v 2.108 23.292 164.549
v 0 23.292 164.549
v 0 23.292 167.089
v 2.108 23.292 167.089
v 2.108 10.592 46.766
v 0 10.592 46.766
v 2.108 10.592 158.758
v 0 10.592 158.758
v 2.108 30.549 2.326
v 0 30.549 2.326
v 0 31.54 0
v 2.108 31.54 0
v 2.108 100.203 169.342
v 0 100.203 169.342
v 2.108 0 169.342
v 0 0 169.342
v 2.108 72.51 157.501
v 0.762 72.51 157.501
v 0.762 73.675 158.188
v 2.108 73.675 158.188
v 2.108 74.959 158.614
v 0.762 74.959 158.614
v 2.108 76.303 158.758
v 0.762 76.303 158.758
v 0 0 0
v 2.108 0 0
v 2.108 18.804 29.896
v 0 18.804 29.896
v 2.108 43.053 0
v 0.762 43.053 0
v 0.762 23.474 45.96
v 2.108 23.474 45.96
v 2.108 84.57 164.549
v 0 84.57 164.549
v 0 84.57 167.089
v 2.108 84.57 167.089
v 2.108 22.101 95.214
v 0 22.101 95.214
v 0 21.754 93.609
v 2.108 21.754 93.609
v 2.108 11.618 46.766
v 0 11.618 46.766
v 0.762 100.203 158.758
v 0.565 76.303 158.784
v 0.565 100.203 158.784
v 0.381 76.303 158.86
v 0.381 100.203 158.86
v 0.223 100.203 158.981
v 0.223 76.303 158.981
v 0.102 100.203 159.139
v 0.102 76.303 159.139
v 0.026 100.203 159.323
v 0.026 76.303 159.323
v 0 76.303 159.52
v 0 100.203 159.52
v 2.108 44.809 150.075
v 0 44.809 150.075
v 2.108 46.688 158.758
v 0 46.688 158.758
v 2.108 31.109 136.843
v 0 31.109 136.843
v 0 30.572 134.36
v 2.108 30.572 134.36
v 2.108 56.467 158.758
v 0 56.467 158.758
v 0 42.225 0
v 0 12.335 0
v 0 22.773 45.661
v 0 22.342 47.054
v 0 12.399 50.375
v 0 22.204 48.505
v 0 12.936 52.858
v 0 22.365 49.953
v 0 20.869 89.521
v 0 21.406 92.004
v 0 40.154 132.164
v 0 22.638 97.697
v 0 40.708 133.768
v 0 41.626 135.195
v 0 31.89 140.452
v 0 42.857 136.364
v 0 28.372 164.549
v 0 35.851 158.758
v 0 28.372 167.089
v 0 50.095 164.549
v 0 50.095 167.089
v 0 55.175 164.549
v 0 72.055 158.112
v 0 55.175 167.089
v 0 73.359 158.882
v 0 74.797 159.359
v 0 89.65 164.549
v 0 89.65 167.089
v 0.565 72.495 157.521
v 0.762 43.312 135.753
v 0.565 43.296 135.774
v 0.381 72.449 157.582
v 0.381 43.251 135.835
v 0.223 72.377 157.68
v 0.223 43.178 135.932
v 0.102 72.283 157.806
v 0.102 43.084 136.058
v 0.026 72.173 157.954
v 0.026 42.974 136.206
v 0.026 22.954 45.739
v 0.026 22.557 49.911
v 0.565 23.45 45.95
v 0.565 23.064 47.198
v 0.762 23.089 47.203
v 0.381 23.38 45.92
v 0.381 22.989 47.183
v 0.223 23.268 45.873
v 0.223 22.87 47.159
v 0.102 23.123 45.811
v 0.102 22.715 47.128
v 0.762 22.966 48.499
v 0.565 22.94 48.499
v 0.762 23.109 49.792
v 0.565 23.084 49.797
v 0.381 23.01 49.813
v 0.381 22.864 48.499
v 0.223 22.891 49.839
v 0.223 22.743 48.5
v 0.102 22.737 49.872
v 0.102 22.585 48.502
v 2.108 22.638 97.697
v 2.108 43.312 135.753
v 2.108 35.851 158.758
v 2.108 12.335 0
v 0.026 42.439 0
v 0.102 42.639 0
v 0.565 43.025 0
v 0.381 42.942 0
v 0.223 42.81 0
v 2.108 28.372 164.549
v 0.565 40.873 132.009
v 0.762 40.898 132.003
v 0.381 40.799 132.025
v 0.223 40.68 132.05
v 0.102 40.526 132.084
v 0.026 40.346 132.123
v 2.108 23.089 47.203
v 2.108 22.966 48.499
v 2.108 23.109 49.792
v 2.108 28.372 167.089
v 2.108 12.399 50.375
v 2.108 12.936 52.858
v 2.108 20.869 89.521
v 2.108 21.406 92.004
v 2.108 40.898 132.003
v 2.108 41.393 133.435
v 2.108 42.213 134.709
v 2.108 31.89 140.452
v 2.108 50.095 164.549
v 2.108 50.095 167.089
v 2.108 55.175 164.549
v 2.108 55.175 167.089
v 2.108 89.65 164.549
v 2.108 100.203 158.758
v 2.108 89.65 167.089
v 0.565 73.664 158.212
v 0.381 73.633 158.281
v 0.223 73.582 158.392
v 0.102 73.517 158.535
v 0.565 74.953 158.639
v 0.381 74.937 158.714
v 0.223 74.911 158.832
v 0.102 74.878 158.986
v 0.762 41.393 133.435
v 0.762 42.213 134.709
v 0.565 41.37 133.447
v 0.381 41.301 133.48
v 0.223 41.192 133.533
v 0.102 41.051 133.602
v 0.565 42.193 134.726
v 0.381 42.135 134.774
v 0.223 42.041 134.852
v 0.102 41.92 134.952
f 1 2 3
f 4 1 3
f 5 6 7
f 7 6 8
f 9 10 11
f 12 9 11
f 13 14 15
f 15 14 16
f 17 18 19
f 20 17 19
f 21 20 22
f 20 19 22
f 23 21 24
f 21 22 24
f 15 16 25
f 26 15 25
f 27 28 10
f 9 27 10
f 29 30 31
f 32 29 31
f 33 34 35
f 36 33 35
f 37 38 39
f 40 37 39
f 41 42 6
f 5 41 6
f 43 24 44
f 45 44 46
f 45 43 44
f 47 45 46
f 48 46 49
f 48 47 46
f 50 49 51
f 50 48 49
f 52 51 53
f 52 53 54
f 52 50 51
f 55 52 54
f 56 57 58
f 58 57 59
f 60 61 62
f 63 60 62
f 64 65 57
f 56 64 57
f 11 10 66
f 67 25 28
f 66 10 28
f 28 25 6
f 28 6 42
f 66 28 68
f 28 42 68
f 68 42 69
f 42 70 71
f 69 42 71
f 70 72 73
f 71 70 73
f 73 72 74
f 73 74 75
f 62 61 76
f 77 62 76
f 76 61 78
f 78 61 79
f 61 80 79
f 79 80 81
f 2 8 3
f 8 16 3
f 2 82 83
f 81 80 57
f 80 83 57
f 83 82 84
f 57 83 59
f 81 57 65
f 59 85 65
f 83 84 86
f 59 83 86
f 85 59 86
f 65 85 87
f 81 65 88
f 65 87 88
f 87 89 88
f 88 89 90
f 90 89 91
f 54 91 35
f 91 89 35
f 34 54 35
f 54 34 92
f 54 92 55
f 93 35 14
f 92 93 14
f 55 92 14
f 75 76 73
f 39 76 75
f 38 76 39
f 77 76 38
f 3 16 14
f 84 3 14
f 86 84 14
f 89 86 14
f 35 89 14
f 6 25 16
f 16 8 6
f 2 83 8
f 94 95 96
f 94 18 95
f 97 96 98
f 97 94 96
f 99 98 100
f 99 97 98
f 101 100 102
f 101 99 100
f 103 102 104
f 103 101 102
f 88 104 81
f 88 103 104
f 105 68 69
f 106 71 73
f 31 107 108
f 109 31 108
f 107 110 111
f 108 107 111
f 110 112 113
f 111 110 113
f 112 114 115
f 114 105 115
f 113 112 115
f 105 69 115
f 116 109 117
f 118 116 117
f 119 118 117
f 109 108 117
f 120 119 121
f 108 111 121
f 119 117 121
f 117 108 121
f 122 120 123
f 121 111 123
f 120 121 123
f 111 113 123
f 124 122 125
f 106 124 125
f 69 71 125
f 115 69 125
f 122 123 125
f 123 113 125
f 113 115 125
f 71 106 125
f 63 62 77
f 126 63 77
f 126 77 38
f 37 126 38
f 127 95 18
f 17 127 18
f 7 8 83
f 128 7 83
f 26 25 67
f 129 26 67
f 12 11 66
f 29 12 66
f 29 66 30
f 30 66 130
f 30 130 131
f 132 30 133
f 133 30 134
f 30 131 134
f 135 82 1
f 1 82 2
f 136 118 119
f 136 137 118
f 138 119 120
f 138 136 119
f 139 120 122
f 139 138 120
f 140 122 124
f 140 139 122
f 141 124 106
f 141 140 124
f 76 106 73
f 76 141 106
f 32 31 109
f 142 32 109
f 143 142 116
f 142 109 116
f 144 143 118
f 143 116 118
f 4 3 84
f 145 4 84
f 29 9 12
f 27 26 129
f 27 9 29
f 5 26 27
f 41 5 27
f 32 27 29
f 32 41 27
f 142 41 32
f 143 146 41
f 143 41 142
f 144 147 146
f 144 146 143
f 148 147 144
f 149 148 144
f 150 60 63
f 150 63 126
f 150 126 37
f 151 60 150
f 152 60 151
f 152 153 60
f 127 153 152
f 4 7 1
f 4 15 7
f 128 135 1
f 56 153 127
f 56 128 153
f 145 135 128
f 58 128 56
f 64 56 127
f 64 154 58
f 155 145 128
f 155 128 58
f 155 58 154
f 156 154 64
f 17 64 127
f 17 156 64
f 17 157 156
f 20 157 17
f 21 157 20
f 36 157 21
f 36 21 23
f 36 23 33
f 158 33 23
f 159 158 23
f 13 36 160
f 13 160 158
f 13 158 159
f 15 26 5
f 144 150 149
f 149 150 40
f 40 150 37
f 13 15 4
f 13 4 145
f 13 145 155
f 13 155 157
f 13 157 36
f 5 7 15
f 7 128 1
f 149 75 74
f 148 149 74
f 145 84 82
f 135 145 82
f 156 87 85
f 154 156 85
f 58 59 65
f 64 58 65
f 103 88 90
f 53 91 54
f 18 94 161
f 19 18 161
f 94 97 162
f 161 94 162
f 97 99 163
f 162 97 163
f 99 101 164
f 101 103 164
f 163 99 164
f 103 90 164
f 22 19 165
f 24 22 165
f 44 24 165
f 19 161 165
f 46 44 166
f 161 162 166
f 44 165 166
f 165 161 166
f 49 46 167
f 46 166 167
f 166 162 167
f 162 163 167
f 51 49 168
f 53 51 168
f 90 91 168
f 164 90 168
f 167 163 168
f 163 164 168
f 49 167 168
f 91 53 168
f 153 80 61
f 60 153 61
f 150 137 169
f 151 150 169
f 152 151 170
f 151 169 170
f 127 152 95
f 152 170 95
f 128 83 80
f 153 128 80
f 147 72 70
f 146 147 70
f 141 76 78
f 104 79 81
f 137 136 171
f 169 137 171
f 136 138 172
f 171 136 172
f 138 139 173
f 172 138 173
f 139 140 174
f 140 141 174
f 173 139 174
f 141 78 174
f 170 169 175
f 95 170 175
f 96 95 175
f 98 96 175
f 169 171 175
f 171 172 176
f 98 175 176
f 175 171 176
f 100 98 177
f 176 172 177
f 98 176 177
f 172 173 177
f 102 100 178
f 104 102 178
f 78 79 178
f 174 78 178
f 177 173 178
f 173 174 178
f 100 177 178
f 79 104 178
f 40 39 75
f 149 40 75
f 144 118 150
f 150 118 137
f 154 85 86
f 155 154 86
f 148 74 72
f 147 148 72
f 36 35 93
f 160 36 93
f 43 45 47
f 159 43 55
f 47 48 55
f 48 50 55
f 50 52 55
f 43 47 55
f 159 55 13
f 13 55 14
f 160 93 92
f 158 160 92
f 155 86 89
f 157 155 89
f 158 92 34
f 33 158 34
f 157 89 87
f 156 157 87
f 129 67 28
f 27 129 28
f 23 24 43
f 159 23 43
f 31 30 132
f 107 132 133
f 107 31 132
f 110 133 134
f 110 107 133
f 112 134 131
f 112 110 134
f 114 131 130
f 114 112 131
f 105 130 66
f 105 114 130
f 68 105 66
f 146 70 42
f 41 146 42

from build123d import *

# Parameters (mm, degrees)
F1_DEPTH = 2.1082
F2_R     = 0.762


# Not quite as in the source:
# - a feature names something its author has since deleted; it is built from what else it names


with BuildPart() as f1:
    # F0 (on Right) → F1 (new body)
    with BuildSketch(Plane.YZ):
        with BuildLine():
            Line((0, 169.3418), (0, 0))
            Line((0, 0), (12.335197777, 0))
            Line((12.335197777, 0), (18.8042013144, 29.896105485))
            Line((18.8042013144, 29.896105485), (30.5493542935, 2.3257501254))
            Line((30.5493542935, 2.3257501254), (31.5401391658, 0))
            Line((31.5401391658, 0), (31.5707651968, 0))
            Line((31.5707651968, 0), (40.8442968098, 0))
            Line((40.8442968098, 0), (20.5594925834, 47.616175108))
            Line((20.5594925834, 47.616175108), (39.5771112022, 135.5049402038))
            Line((39.5771112022, 135.5049402038), (73.5248959406, 160.7899383022))
            Line((73.5248959406, 160.7899383022), (100.203, 160.7899383022))
            Line((100.203, 160.7899383022), (100.203, 162.0091375))
            Line((100.203, 162.0091375), (82.1398573303, 162.0091375))
            ThreePointArc((82.1398573303, 162.0091375), (80.3438061061, 162.7530862758), (79.5998573303, 164.5491375))
            Line((79.5998573303, 164.5491375), (79.5998573303, 169.3418))
            Line((79.5998573303, 169.3418), (70.6874244764, 169.3418))
            Line((70.6874244764, 169.3418), (70.6874244764, 165.8480664454))
            Line((70.6874244764, 165.8480664454), (70.6874244764, 164.5491375))
            ThreePointArc((70.6874244764, 164.5491375), (70.0510915867, 162.8675752701), (68.4609272063, 162.0285589874))
            ThreePointArc((68.4609272063, 162.0285589874), (68.3044763435, 162.0139975214), (68.1474244764, 162.0091375))
            Line((68.1474244764, 162.0091375), (18.2118, 162.0091375))
            ThreePointArc((18.2118, 162.0091375), (16.4157487758, 162.7530862758), (15.6718, 164.5491375))
            Line((15.6718, 164.5491375), (15.6718, 169.3418))
            Line((15.6718, 169.3418), (0, 169.3418))
        make_face()
        Polygon((21.4843682503, 35.8535070154), (23.4753466245, 31.1799211209), (21.1385536773, 30.1844319338), (19.147575303, 34.8580178283), align=None, mode=Mode.SUBTRACT)
        Polygon((25.8665425285, 25.5668719827), (27.8575209028, 20.8932860882), (25.5207279555, 19.8977969011), (23.5297495813, 24.5713827956), align=None, mode=Mode.SUBTRACT)
        with BuildLine():
            Line((12.3986134924, 50.3752630702), (11.6175919588, 46.7658196656))
            Line((11.6175919588, 46.7658196656), (10.5918, 46.7658196656))
            Line((10.5918, 46.7658196656), (10.5918, 158.7579375))
            Line((10.5918, 158.7579375), (35.8507619547, 158.7579375))
            Line((35.8507619547, 158.7579375), (31.8897708968, 140.4524587956))
            Line((31.8897708968, 140.4524587956), (31.1087493632, 136.8430153909))
            Line((31.1087493632, 136.8430153909), (35.5475592049, 135.882533211))
            ThreePointArc((35.5475592049, 135.882533211), (37.1456481821, 134.7755682604), (37.4929253116, 132.8628062845))
            Line((37.4929253116, 132.8628062845), (29.5595533377, 96.1992113407))
            ThreePointArc((29.5595533377, 96.1992113407), (28.452588387, 94.6011223635), (26.5398264112, 94.2538452339))
            Line((26.5398264112, 94.2538452339), (22.1010165695, 95.2143274138))
            Line((22.1010165695, 95.2143274138), (21.7536814278, 93.6091392306))
            Line((21.7536814278, 93.6091392306), (21.4063462861, 92.0039510473))
            Line((21.4063462861, 92.0039510473), (25.8451561277, 91.0434688674))
            ThreePointArc((25.8451561277, 91.0434688674), (27.4432451049, 89.9365039168), (27.7905222345, 88.0237419409))
            Line((27.7905222345, 88.0237419409), (19.8571502605, 51.3601469971))
            ThreePointArc((19.8571502605, 51.3601469971), (18.7501853099, 49.7620580199), (16.837423334, 49.4147808903))
            Line((16.837423334, 49.4147808903), (12.3986134924, 50.3752630702))
        make_face(mode=Mode.SUBTRACT)
        Polygon((47.0613097153, 149.2568137468), (48.5785484084, 147.2197602993), (44.5044415132, 144.1852829132), (42.9872028202, 146.2223363607), align=None, mode=Mode.SUBTRACT)
        Polygon((44.8088104432, 150.074821282), (46.6876875952, 158.7579375), (56.4668125154, 158.7579375), align=None, mode=Mode.SUBTRACT)
        Polygon((63.2751536106, 161.3332132886), (64.7923923036, 159.296159841), (60.7182854085, 156.2616824549), (59.2010467154, 158.2987359025), align=None, mode=Mode.SUBTRACT)
        with BuildLine():
            Line((20.5594925834, 47.616175108), (40.8442968098, 0))
            Line((40.8442968098, 0), (43.053, 0))
            Line((43.053, 0), (23.4736756901, 45.9601445708))
            ThreePointArc((23.4736756901, 45.9601445708), (22.9941781878, 47.847708452), (23.1092917667, 49.7918185633))
            Line((23.1092917667, 49.7918185633), (40.8984089502, 132.0031391675))
            ThreePointArc((40.8984089502, 132.0031391675), (41.765080018, 134.0967787378), (43.3116785091, 135.7528217618))
            Line((43.3116785091, 135.7528217618), (72.5103326221, 157.500571119))
            ThreePointArc((72.5103326221, 157.500571119), (74.3053957564, 158.4354047741), (76.3034293547, 158.7579375))
            Line((76.3034293547, 158.7579375), (100.203, 158.7579375))
            Line((100.203, 158.7579375), (100.203, 160.7899383022))
            Line((100.203, 160.7899383022), (73.5248959406, 160.7899383022))
            Line((73.5248959406, 160.7899383022), (39.5771112022, 135.5049402038))
            Line((39.5771112022, 135.5049402038), (20.5594925834, 47.616175108))
        make_face()
        Polygon((68.1474244764, 169.3418), (18.2118, 169.3418), (18.2118, 164.5491375), (23.2918, 164.5491375), (23.2918, 167.0891375), (28.3718, 167.0891375), (28.3718, 164.5491375), (50.0948093832, 164.5491375), (50.0948093832, 167.0891375), (55.1748093832, 167.0891375), (55.1748093832, 164.5491375), (68.1474244764, 164.5491375), (68.1474244764, 165.0060867035), align=None)
        with BuildLine():
            Line((18.2118, 169.3418), (15.6718, 169.3418))
            Line((15.6718, 169.3418), (15.6718, 164.5491375))
            ThreePointArc((15.6718, 164.5491375), (16.4157487758, 162.7530862758), (18.2118, 162.0091375))
            Line((18.2118, 162.0091375), (68.1474244764, 162.0091375))
            ThreePointArc((68.1474244764, 162.0091375), (68.3044763435, 162.0139975214), (68.4609272063, 162.0285589874))
            Line((68.4609272063, 162.0285589874), (69.6856973646, 162.9407926238))
            Line((69.6856973646, 162.9407926238), (68.1474244764, 165.0060867035))
            Line((68.1474244764, 165.0060867035), (68.1474244764, 164.5491375))
            Line((68.1474244764, 164.5491375), (55.1748093832, 164.5491375))
            Line((55.1748093832, 164.5491375), (50.0948093832, 164.5491375))
            Line((50.0948093832, 164.5491375), (28.3718, 164.5491375))
            Line((28.3718, 164.5491375), (23.2918, 164.5491375))
            Line((23.2918, 164.5491375), (18.2118, 164.5491375))
            Line((18.2118, 164.5491375), (18.2118, 169.3418))
        make_face()
        Polygon((20.8691658762, 89.5214045307), (12.9357939022, 52.8578095868), (17.3746037439, 51.8973274069), (18.6675621562, 57.872655888), (16.1850156395, 58.4098362979), (17.2593764593, 63.3749293312), (19.7419229759, 62.8377489213), (22.9432277355, 77.6323837102), (20.4606812189, 78.16956412), (21.5350420386, 83.1346571533), (24.0175885553, 82.5974767434), (25.3079757178, 88.5609223508), align=None)
        Polygon((35.010378795, 133.3999866944), (30.5715689534, 134.3604688743), (22.6381969794, 97.6968739305), (27.077006821, 96.7363917505), (28.3673939836, 102.6998373579), (25.884847467, 103.2370177677), (26.9592082867, 108.202110801), (29.4417548033, 107.6649303911), (32.643059563, 122.45956518), (30.1605130463, 122.9967455899), (31.2348738661, 127.9618386231), (33.7174203827, 127.4246582133), align=None)
        with BuildLine():
            Line((12.9357939022, 52.8578095868), (12.3986134924, 50.3752630702))
            Line((12.3986134924, 50.3752630702), (16.837423334, 49.4147808903))
            ThreePointArc((16.837423334, 49.4147808903), (18.7501853099, 49.7620580199), (19.8571502605, 51.3601469971))
            Line((19.8571502605, 51.3601469971), (27.7905222345, 88.0237419409))
            ThreePointArc((27.7905222345, 88.0237419409), (27.4432451049, 89.9365039168), (25.8451561277, 91.0434688674))
            Line((25.8451561277, 91.0434688674), (21.4063462861, 92.0039510473))
            Line((21.4063462861, 92.0039510473), (20.8691658762, 89.5214045307))
            Line((20.8691658762, 89.5214045307), (25.3079757178, 88.5609223508))
            Line((25.3079757178, 88.5609223508), (24.0175885553, 82.5974767434))
            Line((24.0175885553, 82.5974767434), (22.9432277355, 77.6323837102))
            Line((22.9432277355, 77.6323837102), (19.7419229759, 62.8377489213))
            Line((19.7419229759, 62.8377489213), (18.6675621562, 57.872655888))
            Line((18.6675621562, 57.872655888), (17.3746037439, 51.8973274069))
            Line((17.3746037439, 51.8973274069), (12.9357939022, 52.8578095868))
        make_face()
        with BuildLine():
            Line((35.5475592049, 135.882533211), (31.1087493632, 136.8430153909))
            Line((31.1087493632, 136.8430153909), (30.5715689534, 134.3604688743))
            Line((30.5715689534, 134.3604688743), (35.010378795, 133.3999866944))
            Line((35.010378795, 133.3999866944), (33.7174203827, 127.4246582133))
            Line((33.7174203827, 127.4246582133), (32.643059563, 122.45956518))
            Line((32.643059563, 122.45956518), (29.4417548033, 107.6649303911))
            Line((29.4417548033, 107.6649303911), (28.3673939836, 102.6998373579))
            Line((28.3673939836, 102.6998373579), (27.077006821, 96.7363917505))
            Line((27.077006821, 96.7363917505), (22.6381969794, 97.6968739305))
            Line((22.6381969794, 97.6968739305), (22.1010165695, 95.2143274138))
            Line((22.1010165695, 95.2143274138), (26.5398264112, 94.2538452339))
            ThreePointArc((26.5398264112, 94.2538452339), (28.452588387, 94.6011223635), (29.5595533377, 96.1992113407))
            Line((29.5595533377, 96.1992113407), (37.4929253116, 132.8628062845))
            ThreePointArc((37.4929253116, 132.8628062845), (37.1456481821, 134.7755682604), (35.5475592049, 135.882533211))
        make_face()
        Polygon((100.203, 169.3418), (82.1398573303, 169.3418), (82.1398573303, 164.5491375), (84.5702663064, 164.5491375), (84.5702663064, 167.0891375), (89.6502663064, 167.0891375), (89.6502663064, 164.5491375), (100.203, 164.5491375), align=None)
        with BuildLine():
            Line((82.1398573303, 169.3418), (79.5998573303, 169.3418))
            Line((79.5998573303, 169.3418), (79.5998573303, 164.5491375))
            ThreePointArc((79.5998573303, 164.5491375), (80.3438061061, 162.7530862758), (82.1398573303, 162.0091375))
            Line((82.1398573303, 162.0091375), (100.203, 162.0091375))
            Line((100.203, 162.0091375), (100.203, 164.5491375))
            Line((100.203, 164.5491375), (89.6502663064, 164.5491375))
            Line((89.6502663064, 164.5491375), (84.5702663064, 164.5491375))
            Line((84.5702663064, 164.5491375), (82.1398573303, 164.5491375))
            Line((82.1398573303, 164.5491375), (82.1398573303, 169.3418))
        make_face()
        with BuildLine():
            Line((70.6874244764, 169.3418), (68.1474244764, 169.3418))
            Line((68.1474244764, 169.3418), (68.1474244764, 165.0060867035))
            Line((68.1474244764, 165.0060867035), (69.6856973646, 162.9407926238))
            Line((69.6856973646, 162.9407926238), (68.4609272063, 162.0285589874))
            ThreePointArc((68.4609272063, 162.0285589874), (70.0510915867, 162.8675752701), (70.6874244764, 164.5491375))
            Line((70.6874244764, 164.5491375), (70.6874244764, 165.8480664454))
            Line((70.6874244764, 165.8480664454), (70.6874244764, 169.3418))
        make_face()
        Polygon((21.1385536773, 30.1844319338), (23.4753466245, 31.1799211209), (21.4843682503, 35.8535070154), (19.147575303, 34.8580178283), align=None)
        Polygon((25.5207279555, 19.8977969011), (27.8575209028, 20.8932860882), (25.8665425285, 25.5668719827), (23.5297495813, 24.5713827956), align=None)
        Polygon((44.5044415132, 144.1852829132), (48.5785484084, 147.2197602993), (47.0613097153, 149.2568137468), (42.9872028202, 146.2223363607), align=None)
        Polygon((60.7182854085, 156.2616824549), (64.7923923036, 159.296159841), (63.2751536106, 161.3332132886), (59.2010467154, 158.2987359025), align=None)
        Polygon((16.1850156395, 58.4098362979), (18.6675621562, 57.872655888), (19.7419229759, 62.8377489213), (17.2593764593, 63.3749293312), align=None)
        Polygon((22.9432277355, 77.6323837102), (24.0175885553, 82.5974767434), (21.5350420386, 83.1346571533), (20.4606812189, 78.16956412), align=None)
        Polygon((32.643059563, 122.45956518), (33.7174203827, 127.4246582133), (31.2348738661, 127.9618386231), (30.1605130463, 122.9967455899), align=None)
        Polygon((25.884847467, 103.2370177677), (28.3673939836, 102.6998373579), (29.4417548033, 107.6649303911), (26.9592082867, 108.202110801), align=None)
    extrude(amount=F1_DEPTH)

    # F2
    f2_edges = [f1.edges().sort_by_distance(p)[0] for p in [
        (0, 32.00385, 90.897479),
        (0, 33.263338, 22.980072),
        (0, 22.994178, 47.847708),
        (0, 41.76508, 134.096779),
        (0, 57.911006, 146.626696),
        (0, 74.305396, 158.435405),
        (0, 88.253215, 158.757937),
    ]]
    fillet(f2_edges, radius=F2_R)


solid = f1.part
